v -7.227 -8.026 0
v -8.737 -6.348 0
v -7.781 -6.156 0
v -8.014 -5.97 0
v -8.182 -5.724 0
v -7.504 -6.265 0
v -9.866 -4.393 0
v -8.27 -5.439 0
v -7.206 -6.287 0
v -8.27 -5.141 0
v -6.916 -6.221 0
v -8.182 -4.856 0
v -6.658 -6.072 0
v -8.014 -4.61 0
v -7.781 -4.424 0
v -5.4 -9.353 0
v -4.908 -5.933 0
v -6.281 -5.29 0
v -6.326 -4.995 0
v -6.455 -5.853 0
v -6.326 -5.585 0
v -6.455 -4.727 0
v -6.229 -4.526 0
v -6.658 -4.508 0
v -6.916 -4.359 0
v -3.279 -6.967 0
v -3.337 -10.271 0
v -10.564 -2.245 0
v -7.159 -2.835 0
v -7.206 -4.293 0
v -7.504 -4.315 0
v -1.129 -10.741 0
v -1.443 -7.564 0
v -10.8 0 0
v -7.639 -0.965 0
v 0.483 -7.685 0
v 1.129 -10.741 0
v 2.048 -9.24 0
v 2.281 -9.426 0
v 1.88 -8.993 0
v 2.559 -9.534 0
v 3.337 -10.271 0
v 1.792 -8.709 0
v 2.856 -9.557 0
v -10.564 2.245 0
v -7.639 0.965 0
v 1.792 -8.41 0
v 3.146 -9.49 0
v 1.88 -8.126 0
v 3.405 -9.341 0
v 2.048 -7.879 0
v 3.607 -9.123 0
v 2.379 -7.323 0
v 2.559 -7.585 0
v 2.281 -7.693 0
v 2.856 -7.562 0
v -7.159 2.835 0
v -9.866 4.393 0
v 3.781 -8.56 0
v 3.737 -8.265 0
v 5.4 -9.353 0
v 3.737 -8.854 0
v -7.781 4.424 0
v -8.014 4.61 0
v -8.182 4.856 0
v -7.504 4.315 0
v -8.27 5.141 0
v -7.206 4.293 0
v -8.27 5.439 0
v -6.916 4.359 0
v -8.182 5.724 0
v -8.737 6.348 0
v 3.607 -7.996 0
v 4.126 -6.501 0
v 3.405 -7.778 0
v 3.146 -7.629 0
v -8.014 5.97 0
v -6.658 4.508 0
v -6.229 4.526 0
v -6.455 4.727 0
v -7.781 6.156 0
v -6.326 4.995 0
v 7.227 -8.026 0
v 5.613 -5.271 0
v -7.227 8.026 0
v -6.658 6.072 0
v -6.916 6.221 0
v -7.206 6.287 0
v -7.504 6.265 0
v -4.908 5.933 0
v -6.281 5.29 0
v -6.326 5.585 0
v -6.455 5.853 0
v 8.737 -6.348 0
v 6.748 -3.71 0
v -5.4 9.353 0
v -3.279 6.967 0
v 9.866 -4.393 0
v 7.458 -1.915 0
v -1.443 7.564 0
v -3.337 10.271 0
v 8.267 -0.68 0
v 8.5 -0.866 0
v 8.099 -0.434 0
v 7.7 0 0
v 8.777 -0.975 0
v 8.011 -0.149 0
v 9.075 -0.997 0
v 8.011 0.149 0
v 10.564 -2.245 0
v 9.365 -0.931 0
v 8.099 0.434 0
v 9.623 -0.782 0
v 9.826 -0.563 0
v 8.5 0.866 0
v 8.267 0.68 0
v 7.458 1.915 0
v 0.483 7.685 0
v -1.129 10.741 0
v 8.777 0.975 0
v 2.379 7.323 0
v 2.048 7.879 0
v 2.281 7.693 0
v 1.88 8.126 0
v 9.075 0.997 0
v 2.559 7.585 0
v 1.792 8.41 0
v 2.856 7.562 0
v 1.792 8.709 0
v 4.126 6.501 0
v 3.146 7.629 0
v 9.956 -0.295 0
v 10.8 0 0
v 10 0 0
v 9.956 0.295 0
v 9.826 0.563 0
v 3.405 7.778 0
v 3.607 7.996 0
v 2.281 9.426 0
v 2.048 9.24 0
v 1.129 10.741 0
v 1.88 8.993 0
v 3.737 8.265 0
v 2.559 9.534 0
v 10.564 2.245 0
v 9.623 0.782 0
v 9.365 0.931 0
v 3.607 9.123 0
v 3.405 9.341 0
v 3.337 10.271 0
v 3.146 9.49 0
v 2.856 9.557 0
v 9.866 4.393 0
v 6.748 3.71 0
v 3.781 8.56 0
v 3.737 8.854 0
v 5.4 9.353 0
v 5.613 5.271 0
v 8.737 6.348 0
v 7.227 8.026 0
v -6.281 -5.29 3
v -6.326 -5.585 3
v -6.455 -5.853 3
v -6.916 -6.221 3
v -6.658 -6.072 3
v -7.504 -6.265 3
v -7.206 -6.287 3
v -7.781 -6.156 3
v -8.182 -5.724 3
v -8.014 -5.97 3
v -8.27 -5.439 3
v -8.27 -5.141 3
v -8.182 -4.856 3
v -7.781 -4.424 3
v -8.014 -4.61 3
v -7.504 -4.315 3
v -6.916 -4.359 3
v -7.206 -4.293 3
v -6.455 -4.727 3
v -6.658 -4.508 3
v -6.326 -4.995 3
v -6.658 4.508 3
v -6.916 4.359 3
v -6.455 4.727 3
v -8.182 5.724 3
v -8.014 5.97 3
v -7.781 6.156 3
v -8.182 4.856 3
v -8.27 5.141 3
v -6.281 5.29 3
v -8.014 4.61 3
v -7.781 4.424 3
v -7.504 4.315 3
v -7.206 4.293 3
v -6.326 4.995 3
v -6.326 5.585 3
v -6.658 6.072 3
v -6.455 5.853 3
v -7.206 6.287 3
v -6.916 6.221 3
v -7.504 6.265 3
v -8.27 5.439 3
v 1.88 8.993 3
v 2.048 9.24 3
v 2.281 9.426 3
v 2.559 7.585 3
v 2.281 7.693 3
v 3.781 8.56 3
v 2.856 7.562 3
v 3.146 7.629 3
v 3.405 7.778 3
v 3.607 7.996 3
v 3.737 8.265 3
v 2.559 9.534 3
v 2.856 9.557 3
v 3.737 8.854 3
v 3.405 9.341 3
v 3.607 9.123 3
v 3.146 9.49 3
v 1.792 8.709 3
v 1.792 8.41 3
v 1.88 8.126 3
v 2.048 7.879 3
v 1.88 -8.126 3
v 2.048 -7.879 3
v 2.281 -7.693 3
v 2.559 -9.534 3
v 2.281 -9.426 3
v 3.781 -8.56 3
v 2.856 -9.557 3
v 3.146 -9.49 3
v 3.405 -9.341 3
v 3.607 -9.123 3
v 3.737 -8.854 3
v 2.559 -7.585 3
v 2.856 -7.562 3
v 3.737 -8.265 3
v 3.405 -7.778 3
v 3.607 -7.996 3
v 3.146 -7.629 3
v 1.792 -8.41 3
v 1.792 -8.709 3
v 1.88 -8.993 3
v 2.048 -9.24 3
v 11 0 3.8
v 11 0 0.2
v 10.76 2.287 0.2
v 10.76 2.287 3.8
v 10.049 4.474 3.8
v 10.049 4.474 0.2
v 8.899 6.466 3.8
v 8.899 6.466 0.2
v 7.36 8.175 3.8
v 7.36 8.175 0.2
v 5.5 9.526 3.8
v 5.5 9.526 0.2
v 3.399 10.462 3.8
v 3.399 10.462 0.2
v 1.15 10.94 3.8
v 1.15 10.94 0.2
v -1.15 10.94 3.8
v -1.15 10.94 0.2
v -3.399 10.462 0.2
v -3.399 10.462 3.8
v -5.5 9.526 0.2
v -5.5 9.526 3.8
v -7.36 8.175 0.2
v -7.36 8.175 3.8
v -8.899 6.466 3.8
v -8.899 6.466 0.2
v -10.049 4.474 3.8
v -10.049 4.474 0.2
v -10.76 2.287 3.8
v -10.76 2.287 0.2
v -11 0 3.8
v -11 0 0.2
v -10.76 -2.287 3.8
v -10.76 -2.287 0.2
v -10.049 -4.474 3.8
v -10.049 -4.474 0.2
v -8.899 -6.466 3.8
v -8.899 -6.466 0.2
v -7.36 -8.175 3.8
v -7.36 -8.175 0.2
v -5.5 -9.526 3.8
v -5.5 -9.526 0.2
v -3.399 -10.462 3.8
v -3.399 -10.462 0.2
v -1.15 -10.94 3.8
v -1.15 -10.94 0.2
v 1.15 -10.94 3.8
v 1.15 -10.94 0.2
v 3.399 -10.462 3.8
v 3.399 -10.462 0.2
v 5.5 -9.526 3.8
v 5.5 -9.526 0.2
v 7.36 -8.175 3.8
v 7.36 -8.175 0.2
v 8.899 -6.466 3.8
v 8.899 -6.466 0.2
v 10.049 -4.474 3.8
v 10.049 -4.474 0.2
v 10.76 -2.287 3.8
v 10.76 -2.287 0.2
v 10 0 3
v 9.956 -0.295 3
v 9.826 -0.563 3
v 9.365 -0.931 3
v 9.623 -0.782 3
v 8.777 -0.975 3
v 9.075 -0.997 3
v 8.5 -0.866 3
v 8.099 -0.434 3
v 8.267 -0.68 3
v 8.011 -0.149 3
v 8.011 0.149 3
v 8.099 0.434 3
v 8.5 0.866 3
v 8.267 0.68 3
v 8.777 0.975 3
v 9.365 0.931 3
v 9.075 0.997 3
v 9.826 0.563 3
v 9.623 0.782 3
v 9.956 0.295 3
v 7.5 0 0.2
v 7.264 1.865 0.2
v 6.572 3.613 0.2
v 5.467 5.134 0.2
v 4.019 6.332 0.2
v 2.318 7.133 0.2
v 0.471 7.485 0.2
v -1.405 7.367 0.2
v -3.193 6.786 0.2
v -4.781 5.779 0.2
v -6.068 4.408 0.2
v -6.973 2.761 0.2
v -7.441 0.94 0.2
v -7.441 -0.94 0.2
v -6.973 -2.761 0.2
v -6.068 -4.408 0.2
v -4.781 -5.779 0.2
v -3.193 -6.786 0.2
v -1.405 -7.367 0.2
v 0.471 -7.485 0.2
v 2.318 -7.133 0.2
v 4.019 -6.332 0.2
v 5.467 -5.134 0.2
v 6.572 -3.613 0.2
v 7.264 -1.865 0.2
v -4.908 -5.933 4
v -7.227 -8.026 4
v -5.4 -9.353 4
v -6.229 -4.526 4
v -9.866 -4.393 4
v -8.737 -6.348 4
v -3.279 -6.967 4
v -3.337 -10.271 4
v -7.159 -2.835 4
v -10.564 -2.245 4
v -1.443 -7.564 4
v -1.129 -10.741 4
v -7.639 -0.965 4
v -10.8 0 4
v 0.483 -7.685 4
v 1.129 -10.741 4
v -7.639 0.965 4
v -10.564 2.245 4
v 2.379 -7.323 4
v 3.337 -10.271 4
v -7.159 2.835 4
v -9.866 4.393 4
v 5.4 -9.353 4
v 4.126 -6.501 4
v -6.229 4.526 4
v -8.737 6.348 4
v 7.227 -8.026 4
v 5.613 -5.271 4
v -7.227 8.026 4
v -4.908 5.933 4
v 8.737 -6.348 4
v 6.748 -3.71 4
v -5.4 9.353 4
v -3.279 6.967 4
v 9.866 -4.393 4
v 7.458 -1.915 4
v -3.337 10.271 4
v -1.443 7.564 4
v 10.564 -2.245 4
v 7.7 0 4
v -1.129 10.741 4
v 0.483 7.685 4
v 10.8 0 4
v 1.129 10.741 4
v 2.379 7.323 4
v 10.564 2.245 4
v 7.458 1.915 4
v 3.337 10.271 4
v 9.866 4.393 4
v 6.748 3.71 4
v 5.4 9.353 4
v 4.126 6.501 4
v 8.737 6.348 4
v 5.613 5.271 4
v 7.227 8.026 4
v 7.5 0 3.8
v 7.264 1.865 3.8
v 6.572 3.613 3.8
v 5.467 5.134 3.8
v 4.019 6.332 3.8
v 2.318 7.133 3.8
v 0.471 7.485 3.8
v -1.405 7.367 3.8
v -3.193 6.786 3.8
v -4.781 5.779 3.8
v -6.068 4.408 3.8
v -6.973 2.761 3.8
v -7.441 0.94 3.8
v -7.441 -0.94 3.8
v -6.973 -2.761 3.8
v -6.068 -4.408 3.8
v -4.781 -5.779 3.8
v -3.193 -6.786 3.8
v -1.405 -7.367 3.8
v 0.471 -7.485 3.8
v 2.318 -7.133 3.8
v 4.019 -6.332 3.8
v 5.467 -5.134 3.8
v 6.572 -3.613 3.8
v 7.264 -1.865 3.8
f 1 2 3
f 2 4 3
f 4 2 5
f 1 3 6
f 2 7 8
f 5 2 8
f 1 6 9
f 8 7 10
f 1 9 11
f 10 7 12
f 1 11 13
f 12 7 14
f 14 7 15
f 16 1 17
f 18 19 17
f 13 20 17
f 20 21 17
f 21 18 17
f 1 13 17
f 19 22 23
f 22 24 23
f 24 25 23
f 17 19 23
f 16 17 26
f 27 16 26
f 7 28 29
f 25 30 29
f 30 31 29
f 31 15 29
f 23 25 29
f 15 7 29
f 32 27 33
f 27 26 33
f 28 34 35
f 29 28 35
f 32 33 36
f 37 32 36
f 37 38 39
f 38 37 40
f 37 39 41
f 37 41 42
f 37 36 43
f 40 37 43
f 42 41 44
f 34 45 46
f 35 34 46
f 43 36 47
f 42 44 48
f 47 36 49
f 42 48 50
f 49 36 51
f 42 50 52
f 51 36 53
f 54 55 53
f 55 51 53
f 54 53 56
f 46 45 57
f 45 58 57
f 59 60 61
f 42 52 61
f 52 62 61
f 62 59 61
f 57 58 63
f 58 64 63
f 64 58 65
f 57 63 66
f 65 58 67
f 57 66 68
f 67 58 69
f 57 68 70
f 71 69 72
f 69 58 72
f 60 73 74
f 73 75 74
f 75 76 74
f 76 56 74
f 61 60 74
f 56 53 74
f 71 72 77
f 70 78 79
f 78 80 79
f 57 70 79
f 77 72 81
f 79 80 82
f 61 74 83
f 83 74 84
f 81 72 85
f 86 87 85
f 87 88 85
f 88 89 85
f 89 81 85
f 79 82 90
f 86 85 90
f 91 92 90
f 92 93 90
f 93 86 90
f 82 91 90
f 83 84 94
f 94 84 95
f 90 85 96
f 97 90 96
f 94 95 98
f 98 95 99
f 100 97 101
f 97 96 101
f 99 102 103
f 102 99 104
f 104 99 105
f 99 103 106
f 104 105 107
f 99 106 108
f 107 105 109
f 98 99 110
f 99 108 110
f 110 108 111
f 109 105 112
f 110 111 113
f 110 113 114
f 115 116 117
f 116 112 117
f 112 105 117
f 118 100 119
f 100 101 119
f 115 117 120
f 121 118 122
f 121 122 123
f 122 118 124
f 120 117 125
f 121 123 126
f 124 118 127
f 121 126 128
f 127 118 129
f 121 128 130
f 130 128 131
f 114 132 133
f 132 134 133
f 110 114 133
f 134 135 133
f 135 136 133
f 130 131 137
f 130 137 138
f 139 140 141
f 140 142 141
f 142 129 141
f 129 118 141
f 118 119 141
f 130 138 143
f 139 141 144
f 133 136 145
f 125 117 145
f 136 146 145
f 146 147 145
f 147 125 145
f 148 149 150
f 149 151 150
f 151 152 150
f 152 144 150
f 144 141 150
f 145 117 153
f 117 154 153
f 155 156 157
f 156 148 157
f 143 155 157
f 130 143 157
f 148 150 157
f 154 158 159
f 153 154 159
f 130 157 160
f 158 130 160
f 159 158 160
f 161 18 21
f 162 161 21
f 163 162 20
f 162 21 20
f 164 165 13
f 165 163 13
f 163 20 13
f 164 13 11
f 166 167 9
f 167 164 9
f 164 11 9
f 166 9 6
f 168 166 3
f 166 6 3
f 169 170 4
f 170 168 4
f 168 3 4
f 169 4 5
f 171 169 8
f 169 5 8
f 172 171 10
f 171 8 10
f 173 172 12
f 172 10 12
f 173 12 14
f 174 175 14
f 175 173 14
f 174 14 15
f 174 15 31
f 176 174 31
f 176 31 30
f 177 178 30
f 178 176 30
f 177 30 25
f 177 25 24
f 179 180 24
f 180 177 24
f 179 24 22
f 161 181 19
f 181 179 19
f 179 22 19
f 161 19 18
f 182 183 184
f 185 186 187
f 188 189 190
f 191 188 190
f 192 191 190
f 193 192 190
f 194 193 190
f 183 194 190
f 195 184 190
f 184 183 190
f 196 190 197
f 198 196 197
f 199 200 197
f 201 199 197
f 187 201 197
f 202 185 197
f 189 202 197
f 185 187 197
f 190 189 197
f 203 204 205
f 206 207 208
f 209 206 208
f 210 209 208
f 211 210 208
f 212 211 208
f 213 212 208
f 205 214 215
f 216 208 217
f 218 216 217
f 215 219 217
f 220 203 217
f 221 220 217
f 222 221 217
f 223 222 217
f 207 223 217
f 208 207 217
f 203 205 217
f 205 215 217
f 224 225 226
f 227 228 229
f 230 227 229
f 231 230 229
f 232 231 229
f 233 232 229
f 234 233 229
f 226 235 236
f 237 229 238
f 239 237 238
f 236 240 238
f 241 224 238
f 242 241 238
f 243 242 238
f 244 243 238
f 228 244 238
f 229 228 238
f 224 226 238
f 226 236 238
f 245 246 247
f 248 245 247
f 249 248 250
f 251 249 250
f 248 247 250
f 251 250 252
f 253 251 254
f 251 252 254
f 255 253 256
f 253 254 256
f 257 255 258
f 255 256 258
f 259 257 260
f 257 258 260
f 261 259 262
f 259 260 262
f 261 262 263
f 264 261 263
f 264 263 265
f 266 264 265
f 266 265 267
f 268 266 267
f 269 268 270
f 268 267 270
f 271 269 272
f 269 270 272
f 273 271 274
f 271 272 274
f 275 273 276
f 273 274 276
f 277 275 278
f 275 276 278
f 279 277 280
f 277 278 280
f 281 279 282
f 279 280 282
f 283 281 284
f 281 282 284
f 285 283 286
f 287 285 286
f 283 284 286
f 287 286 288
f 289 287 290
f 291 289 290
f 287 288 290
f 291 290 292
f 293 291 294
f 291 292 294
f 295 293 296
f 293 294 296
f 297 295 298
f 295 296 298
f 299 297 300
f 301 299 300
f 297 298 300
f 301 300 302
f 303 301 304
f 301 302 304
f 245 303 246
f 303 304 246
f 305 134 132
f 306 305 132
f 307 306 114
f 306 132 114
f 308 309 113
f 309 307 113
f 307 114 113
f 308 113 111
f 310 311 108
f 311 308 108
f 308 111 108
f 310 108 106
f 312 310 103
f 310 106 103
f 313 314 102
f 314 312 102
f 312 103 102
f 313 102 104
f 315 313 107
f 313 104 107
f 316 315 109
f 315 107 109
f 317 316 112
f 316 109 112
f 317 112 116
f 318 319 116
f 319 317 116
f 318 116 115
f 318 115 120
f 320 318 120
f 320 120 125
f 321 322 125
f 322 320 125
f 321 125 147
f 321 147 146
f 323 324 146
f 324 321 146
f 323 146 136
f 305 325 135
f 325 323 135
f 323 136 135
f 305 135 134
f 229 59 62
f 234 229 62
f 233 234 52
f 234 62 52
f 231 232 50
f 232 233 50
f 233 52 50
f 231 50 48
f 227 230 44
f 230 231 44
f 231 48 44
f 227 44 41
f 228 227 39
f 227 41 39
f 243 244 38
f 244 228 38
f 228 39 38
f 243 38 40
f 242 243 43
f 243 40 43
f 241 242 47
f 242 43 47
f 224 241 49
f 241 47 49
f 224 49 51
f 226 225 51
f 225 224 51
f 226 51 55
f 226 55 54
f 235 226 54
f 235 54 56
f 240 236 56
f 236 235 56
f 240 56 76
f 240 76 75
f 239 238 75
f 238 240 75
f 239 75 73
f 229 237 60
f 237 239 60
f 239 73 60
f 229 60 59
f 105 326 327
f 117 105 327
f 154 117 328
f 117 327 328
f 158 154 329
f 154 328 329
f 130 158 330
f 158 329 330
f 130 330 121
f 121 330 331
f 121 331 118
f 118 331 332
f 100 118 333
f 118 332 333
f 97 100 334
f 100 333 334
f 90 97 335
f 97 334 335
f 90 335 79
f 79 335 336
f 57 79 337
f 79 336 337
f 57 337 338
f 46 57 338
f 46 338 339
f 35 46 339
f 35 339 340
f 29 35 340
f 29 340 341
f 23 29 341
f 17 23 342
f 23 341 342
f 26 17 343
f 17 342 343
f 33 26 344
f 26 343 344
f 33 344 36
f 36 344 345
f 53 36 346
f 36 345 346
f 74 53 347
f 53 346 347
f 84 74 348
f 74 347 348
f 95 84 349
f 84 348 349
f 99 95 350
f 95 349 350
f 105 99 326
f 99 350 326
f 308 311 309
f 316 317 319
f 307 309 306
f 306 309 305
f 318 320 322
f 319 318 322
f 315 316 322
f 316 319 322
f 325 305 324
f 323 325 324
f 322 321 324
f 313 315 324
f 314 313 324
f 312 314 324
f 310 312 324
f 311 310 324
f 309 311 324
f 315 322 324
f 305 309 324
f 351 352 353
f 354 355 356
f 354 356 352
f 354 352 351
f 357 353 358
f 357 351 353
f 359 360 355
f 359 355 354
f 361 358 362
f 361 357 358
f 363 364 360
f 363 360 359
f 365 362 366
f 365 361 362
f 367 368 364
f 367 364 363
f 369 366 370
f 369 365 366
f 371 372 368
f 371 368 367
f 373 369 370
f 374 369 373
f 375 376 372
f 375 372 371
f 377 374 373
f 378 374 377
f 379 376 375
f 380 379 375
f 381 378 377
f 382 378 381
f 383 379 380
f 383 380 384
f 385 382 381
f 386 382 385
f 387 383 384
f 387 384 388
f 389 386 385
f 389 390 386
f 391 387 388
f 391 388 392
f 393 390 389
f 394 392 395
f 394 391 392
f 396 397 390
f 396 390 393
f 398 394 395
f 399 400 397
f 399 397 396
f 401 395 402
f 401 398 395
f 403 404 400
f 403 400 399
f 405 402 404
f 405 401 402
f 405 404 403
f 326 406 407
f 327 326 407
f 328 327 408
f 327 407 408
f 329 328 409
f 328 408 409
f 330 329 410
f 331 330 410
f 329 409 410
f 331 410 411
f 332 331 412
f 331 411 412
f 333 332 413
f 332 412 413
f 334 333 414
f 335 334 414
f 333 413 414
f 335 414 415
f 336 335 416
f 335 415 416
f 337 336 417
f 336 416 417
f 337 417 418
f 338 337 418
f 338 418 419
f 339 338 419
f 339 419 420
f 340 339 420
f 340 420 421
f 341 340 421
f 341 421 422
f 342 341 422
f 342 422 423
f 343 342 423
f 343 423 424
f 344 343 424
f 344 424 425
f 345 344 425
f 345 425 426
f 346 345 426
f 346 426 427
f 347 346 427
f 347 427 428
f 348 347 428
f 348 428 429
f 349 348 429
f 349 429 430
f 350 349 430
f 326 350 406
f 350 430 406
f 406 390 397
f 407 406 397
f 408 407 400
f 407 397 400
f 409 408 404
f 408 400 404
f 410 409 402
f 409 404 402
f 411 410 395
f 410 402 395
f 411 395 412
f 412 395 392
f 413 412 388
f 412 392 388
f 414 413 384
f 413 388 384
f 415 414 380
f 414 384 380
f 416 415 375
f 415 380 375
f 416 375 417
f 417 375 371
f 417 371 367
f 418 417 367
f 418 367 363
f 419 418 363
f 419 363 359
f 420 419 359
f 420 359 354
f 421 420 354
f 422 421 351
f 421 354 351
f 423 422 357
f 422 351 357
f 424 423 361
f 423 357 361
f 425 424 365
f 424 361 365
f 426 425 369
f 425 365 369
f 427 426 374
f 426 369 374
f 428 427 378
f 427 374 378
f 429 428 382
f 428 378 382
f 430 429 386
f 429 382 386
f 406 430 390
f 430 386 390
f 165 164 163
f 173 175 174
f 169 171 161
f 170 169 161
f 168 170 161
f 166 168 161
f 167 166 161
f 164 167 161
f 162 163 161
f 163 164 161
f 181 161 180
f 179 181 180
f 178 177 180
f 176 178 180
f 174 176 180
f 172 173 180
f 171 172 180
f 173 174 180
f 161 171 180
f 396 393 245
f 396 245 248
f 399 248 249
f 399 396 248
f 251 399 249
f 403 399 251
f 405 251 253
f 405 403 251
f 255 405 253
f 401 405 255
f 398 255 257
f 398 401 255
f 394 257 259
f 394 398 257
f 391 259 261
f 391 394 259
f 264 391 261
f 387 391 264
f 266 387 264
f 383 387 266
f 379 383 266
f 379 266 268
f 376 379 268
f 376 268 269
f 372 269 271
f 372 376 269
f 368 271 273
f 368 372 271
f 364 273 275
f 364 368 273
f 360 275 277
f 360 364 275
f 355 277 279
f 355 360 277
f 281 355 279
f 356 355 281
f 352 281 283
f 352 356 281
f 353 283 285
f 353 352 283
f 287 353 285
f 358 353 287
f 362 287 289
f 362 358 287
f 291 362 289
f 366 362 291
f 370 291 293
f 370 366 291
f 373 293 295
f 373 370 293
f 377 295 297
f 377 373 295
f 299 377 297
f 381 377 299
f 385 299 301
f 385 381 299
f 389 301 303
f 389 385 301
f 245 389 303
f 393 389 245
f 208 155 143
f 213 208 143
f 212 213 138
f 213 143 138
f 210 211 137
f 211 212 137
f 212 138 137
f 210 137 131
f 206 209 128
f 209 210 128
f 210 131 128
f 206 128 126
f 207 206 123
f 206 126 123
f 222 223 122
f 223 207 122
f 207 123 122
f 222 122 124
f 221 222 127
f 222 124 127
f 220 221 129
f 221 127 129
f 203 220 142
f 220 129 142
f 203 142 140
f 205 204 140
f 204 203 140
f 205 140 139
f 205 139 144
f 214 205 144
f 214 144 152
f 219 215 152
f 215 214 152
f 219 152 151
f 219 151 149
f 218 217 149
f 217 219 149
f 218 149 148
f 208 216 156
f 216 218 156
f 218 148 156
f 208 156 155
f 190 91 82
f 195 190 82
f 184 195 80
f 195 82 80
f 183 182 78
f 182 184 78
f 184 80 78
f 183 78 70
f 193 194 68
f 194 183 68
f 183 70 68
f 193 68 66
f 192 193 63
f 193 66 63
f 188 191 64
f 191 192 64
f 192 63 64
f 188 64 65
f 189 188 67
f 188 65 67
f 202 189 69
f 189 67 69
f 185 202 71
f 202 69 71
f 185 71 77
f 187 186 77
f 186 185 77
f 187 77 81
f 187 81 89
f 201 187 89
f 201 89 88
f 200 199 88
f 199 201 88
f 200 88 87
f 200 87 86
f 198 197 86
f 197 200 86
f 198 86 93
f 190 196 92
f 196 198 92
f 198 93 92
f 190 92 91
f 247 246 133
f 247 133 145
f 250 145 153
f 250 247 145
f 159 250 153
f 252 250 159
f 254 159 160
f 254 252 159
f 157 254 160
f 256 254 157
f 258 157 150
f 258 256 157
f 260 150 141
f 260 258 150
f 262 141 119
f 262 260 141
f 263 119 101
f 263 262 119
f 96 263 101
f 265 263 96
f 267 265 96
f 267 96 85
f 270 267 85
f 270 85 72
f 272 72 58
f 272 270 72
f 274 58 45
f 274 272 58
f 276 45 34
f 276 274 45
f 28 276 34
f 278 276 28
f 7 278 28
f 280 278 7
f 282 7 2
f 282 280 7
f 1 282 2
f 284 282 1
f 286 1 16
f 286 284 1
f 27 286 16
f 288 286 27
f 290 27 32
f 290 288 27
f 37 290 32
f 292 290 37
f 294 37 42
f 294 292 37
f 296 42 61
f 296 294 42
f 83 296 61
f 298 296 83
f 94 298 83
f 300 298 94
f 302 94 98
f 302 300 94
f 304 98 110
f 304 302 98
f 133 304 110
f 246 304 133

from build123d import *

# Parameters (mm, degrees)
SKETCH_1_R          = 11
SKETCH_1_R_2        = 1
EXTRUDE_1_DEPTH     = 4
EXTRUDE_START       = -12
SKETCH_3_R          = 1
EXTRUDE_2_DEPTH     = 12
SKETCH_12_R         = 1
CUT_EXTRUDE_4_DEPTH = 20
SKETCH_13_R         = 7.5
CUT_EXTRUDE_5_DEPTH = 17.062378404
EXTRUDE_START_2     = -1
SKETCH_14_R         = 1
EXTRUDE_3_DEPTH     = 1
CHAMFER_1_SIZE      = 0.2


with BuildPart() as part:
    # 草图1 → 凸台-拉伸1 (new body)
    with BuildSketch(Plane.XY):
        Circle(SKETCH_1_R)
        with Locations((9, 0)):
            Circle(SKETCH_1_R_2, mode=Mode.SUBTRACT)
        with Locations((2.781152949, -8.559508647)):
            Circle(SKETCH_1_R_2, mode=Mode.SUBTRACT)
        with Locations((-7.281152949, -5.290067271)):
            Circle(SKETCH_1_R_2, mode=Mode.SUBTRACT)
        with Locations((-7.281152949, 5.290067271)):
            Circle(SKETCH_1_R_2, mode=Mode.SUBTRACT)
        with Locations((2.781152949, 8.559508647)):
            Circle(SKETCH_1_R_2, mode=Mode.SUBTRACT)
    extrude(amount=EXTRUDE_1_DEPTH)

    # 草图3 → 凸台-拉伸2 (add)
    with BuildSketch(Plane.XY.offset(4).offset(EXTRUDE_START)):
        with Locations((9, 0)):
            Circle(SKETCH_3_R)
        with Locations((2.781152949, -8.559508647)):
            Circle(SKETCH_3_R)
        with Locations((-7.281152949, -5.290067271)):
            Circle(SKETCH_3_R)
        with Locations((-7.281152949, 5.290067271)):
            Circle(SKETCH_3_R)
        with Locations((2.781152949, 8.559508647)):
            Circle(SKETCH_3_R)
    extrude(amount=EXTRUDE_2_DEPTH)

    # 草图12 → 切除-拉伸4 (cut)
    with BuildSketch(Plane(origin=(0, 0, -8), x_dir=(-1, 0, 0), z_dir=(0, 0, -1))):
        with Locations(Location((-2.781152949, -8.559508647, 0), (0, 0, 180))):
            Circle(SKETCH_12_R)
        with Locations(Location((7.281152949, 5.290067271, 0), (0, 0, 180))):
            Circle(SKETCH_12_R)
        with Locations(Location((-2.781152949, 8.559508647, 0), (0, 0, 180))):
            Circle(SKETCH_12_R)
        with Locations(Location((-9, 0, 0), (0, 0, 180))):
            Circle(SKETCH_12_R)
        with Locations(Location((7.281152949, -5.290067271, 0), (0, 0, 180))):
            Circle(SKETCH_12_R)
    extrude(amount=-CUT_EXTRUDE_4_DEPTH, mode=Mode.SUBTRACT)

    # 草图13 → 切除-拉伸5 (cut, through all)
    with BuildSketch(Plane.XY.offset(4)):
        Circle(SKETCH_13_R)
    extrude(amount=-CUT_EXTRUDE_5_DEPTH, mode=Mode.SUBTRACT)

    # 草图14 → 凸台-拉伸3 (add)
    with BuildSketch(Plane.XY.offset(4).offset(EXTRUDE_START_2)):
        with Locations((-7.281152949, -5.290067271)):
            Circle(SKETCH_14_R)
        with Locations((2.781152949, -8.559508647)):
            Circle(SKETCH_14_R)
        with Locations((9, 0)):
            Circle(SKETCH_14_R)
        with Locations((2.781152949, 8.559508647)):
            Circle(SKETCH_14_R)
        with Locations((-7.281152949, 5.290067271)):
            Circle(SKETCH_14_R)
    extrude(amount=EXTRUDE_3_DEPTH)

    # 倒角1
    chamfer_1_edges = [part.edges().sort_by_distance(p)[0] for p in [
        (-11, 0, 0),
        (-11, 0, 4),
        (-7.5, 0, 0),
        (-7.5, 0, 4),
    ]]
    chamfer(chamfer_1_edges, length=CHAMFER_1_SIZE)


solid = part.part
